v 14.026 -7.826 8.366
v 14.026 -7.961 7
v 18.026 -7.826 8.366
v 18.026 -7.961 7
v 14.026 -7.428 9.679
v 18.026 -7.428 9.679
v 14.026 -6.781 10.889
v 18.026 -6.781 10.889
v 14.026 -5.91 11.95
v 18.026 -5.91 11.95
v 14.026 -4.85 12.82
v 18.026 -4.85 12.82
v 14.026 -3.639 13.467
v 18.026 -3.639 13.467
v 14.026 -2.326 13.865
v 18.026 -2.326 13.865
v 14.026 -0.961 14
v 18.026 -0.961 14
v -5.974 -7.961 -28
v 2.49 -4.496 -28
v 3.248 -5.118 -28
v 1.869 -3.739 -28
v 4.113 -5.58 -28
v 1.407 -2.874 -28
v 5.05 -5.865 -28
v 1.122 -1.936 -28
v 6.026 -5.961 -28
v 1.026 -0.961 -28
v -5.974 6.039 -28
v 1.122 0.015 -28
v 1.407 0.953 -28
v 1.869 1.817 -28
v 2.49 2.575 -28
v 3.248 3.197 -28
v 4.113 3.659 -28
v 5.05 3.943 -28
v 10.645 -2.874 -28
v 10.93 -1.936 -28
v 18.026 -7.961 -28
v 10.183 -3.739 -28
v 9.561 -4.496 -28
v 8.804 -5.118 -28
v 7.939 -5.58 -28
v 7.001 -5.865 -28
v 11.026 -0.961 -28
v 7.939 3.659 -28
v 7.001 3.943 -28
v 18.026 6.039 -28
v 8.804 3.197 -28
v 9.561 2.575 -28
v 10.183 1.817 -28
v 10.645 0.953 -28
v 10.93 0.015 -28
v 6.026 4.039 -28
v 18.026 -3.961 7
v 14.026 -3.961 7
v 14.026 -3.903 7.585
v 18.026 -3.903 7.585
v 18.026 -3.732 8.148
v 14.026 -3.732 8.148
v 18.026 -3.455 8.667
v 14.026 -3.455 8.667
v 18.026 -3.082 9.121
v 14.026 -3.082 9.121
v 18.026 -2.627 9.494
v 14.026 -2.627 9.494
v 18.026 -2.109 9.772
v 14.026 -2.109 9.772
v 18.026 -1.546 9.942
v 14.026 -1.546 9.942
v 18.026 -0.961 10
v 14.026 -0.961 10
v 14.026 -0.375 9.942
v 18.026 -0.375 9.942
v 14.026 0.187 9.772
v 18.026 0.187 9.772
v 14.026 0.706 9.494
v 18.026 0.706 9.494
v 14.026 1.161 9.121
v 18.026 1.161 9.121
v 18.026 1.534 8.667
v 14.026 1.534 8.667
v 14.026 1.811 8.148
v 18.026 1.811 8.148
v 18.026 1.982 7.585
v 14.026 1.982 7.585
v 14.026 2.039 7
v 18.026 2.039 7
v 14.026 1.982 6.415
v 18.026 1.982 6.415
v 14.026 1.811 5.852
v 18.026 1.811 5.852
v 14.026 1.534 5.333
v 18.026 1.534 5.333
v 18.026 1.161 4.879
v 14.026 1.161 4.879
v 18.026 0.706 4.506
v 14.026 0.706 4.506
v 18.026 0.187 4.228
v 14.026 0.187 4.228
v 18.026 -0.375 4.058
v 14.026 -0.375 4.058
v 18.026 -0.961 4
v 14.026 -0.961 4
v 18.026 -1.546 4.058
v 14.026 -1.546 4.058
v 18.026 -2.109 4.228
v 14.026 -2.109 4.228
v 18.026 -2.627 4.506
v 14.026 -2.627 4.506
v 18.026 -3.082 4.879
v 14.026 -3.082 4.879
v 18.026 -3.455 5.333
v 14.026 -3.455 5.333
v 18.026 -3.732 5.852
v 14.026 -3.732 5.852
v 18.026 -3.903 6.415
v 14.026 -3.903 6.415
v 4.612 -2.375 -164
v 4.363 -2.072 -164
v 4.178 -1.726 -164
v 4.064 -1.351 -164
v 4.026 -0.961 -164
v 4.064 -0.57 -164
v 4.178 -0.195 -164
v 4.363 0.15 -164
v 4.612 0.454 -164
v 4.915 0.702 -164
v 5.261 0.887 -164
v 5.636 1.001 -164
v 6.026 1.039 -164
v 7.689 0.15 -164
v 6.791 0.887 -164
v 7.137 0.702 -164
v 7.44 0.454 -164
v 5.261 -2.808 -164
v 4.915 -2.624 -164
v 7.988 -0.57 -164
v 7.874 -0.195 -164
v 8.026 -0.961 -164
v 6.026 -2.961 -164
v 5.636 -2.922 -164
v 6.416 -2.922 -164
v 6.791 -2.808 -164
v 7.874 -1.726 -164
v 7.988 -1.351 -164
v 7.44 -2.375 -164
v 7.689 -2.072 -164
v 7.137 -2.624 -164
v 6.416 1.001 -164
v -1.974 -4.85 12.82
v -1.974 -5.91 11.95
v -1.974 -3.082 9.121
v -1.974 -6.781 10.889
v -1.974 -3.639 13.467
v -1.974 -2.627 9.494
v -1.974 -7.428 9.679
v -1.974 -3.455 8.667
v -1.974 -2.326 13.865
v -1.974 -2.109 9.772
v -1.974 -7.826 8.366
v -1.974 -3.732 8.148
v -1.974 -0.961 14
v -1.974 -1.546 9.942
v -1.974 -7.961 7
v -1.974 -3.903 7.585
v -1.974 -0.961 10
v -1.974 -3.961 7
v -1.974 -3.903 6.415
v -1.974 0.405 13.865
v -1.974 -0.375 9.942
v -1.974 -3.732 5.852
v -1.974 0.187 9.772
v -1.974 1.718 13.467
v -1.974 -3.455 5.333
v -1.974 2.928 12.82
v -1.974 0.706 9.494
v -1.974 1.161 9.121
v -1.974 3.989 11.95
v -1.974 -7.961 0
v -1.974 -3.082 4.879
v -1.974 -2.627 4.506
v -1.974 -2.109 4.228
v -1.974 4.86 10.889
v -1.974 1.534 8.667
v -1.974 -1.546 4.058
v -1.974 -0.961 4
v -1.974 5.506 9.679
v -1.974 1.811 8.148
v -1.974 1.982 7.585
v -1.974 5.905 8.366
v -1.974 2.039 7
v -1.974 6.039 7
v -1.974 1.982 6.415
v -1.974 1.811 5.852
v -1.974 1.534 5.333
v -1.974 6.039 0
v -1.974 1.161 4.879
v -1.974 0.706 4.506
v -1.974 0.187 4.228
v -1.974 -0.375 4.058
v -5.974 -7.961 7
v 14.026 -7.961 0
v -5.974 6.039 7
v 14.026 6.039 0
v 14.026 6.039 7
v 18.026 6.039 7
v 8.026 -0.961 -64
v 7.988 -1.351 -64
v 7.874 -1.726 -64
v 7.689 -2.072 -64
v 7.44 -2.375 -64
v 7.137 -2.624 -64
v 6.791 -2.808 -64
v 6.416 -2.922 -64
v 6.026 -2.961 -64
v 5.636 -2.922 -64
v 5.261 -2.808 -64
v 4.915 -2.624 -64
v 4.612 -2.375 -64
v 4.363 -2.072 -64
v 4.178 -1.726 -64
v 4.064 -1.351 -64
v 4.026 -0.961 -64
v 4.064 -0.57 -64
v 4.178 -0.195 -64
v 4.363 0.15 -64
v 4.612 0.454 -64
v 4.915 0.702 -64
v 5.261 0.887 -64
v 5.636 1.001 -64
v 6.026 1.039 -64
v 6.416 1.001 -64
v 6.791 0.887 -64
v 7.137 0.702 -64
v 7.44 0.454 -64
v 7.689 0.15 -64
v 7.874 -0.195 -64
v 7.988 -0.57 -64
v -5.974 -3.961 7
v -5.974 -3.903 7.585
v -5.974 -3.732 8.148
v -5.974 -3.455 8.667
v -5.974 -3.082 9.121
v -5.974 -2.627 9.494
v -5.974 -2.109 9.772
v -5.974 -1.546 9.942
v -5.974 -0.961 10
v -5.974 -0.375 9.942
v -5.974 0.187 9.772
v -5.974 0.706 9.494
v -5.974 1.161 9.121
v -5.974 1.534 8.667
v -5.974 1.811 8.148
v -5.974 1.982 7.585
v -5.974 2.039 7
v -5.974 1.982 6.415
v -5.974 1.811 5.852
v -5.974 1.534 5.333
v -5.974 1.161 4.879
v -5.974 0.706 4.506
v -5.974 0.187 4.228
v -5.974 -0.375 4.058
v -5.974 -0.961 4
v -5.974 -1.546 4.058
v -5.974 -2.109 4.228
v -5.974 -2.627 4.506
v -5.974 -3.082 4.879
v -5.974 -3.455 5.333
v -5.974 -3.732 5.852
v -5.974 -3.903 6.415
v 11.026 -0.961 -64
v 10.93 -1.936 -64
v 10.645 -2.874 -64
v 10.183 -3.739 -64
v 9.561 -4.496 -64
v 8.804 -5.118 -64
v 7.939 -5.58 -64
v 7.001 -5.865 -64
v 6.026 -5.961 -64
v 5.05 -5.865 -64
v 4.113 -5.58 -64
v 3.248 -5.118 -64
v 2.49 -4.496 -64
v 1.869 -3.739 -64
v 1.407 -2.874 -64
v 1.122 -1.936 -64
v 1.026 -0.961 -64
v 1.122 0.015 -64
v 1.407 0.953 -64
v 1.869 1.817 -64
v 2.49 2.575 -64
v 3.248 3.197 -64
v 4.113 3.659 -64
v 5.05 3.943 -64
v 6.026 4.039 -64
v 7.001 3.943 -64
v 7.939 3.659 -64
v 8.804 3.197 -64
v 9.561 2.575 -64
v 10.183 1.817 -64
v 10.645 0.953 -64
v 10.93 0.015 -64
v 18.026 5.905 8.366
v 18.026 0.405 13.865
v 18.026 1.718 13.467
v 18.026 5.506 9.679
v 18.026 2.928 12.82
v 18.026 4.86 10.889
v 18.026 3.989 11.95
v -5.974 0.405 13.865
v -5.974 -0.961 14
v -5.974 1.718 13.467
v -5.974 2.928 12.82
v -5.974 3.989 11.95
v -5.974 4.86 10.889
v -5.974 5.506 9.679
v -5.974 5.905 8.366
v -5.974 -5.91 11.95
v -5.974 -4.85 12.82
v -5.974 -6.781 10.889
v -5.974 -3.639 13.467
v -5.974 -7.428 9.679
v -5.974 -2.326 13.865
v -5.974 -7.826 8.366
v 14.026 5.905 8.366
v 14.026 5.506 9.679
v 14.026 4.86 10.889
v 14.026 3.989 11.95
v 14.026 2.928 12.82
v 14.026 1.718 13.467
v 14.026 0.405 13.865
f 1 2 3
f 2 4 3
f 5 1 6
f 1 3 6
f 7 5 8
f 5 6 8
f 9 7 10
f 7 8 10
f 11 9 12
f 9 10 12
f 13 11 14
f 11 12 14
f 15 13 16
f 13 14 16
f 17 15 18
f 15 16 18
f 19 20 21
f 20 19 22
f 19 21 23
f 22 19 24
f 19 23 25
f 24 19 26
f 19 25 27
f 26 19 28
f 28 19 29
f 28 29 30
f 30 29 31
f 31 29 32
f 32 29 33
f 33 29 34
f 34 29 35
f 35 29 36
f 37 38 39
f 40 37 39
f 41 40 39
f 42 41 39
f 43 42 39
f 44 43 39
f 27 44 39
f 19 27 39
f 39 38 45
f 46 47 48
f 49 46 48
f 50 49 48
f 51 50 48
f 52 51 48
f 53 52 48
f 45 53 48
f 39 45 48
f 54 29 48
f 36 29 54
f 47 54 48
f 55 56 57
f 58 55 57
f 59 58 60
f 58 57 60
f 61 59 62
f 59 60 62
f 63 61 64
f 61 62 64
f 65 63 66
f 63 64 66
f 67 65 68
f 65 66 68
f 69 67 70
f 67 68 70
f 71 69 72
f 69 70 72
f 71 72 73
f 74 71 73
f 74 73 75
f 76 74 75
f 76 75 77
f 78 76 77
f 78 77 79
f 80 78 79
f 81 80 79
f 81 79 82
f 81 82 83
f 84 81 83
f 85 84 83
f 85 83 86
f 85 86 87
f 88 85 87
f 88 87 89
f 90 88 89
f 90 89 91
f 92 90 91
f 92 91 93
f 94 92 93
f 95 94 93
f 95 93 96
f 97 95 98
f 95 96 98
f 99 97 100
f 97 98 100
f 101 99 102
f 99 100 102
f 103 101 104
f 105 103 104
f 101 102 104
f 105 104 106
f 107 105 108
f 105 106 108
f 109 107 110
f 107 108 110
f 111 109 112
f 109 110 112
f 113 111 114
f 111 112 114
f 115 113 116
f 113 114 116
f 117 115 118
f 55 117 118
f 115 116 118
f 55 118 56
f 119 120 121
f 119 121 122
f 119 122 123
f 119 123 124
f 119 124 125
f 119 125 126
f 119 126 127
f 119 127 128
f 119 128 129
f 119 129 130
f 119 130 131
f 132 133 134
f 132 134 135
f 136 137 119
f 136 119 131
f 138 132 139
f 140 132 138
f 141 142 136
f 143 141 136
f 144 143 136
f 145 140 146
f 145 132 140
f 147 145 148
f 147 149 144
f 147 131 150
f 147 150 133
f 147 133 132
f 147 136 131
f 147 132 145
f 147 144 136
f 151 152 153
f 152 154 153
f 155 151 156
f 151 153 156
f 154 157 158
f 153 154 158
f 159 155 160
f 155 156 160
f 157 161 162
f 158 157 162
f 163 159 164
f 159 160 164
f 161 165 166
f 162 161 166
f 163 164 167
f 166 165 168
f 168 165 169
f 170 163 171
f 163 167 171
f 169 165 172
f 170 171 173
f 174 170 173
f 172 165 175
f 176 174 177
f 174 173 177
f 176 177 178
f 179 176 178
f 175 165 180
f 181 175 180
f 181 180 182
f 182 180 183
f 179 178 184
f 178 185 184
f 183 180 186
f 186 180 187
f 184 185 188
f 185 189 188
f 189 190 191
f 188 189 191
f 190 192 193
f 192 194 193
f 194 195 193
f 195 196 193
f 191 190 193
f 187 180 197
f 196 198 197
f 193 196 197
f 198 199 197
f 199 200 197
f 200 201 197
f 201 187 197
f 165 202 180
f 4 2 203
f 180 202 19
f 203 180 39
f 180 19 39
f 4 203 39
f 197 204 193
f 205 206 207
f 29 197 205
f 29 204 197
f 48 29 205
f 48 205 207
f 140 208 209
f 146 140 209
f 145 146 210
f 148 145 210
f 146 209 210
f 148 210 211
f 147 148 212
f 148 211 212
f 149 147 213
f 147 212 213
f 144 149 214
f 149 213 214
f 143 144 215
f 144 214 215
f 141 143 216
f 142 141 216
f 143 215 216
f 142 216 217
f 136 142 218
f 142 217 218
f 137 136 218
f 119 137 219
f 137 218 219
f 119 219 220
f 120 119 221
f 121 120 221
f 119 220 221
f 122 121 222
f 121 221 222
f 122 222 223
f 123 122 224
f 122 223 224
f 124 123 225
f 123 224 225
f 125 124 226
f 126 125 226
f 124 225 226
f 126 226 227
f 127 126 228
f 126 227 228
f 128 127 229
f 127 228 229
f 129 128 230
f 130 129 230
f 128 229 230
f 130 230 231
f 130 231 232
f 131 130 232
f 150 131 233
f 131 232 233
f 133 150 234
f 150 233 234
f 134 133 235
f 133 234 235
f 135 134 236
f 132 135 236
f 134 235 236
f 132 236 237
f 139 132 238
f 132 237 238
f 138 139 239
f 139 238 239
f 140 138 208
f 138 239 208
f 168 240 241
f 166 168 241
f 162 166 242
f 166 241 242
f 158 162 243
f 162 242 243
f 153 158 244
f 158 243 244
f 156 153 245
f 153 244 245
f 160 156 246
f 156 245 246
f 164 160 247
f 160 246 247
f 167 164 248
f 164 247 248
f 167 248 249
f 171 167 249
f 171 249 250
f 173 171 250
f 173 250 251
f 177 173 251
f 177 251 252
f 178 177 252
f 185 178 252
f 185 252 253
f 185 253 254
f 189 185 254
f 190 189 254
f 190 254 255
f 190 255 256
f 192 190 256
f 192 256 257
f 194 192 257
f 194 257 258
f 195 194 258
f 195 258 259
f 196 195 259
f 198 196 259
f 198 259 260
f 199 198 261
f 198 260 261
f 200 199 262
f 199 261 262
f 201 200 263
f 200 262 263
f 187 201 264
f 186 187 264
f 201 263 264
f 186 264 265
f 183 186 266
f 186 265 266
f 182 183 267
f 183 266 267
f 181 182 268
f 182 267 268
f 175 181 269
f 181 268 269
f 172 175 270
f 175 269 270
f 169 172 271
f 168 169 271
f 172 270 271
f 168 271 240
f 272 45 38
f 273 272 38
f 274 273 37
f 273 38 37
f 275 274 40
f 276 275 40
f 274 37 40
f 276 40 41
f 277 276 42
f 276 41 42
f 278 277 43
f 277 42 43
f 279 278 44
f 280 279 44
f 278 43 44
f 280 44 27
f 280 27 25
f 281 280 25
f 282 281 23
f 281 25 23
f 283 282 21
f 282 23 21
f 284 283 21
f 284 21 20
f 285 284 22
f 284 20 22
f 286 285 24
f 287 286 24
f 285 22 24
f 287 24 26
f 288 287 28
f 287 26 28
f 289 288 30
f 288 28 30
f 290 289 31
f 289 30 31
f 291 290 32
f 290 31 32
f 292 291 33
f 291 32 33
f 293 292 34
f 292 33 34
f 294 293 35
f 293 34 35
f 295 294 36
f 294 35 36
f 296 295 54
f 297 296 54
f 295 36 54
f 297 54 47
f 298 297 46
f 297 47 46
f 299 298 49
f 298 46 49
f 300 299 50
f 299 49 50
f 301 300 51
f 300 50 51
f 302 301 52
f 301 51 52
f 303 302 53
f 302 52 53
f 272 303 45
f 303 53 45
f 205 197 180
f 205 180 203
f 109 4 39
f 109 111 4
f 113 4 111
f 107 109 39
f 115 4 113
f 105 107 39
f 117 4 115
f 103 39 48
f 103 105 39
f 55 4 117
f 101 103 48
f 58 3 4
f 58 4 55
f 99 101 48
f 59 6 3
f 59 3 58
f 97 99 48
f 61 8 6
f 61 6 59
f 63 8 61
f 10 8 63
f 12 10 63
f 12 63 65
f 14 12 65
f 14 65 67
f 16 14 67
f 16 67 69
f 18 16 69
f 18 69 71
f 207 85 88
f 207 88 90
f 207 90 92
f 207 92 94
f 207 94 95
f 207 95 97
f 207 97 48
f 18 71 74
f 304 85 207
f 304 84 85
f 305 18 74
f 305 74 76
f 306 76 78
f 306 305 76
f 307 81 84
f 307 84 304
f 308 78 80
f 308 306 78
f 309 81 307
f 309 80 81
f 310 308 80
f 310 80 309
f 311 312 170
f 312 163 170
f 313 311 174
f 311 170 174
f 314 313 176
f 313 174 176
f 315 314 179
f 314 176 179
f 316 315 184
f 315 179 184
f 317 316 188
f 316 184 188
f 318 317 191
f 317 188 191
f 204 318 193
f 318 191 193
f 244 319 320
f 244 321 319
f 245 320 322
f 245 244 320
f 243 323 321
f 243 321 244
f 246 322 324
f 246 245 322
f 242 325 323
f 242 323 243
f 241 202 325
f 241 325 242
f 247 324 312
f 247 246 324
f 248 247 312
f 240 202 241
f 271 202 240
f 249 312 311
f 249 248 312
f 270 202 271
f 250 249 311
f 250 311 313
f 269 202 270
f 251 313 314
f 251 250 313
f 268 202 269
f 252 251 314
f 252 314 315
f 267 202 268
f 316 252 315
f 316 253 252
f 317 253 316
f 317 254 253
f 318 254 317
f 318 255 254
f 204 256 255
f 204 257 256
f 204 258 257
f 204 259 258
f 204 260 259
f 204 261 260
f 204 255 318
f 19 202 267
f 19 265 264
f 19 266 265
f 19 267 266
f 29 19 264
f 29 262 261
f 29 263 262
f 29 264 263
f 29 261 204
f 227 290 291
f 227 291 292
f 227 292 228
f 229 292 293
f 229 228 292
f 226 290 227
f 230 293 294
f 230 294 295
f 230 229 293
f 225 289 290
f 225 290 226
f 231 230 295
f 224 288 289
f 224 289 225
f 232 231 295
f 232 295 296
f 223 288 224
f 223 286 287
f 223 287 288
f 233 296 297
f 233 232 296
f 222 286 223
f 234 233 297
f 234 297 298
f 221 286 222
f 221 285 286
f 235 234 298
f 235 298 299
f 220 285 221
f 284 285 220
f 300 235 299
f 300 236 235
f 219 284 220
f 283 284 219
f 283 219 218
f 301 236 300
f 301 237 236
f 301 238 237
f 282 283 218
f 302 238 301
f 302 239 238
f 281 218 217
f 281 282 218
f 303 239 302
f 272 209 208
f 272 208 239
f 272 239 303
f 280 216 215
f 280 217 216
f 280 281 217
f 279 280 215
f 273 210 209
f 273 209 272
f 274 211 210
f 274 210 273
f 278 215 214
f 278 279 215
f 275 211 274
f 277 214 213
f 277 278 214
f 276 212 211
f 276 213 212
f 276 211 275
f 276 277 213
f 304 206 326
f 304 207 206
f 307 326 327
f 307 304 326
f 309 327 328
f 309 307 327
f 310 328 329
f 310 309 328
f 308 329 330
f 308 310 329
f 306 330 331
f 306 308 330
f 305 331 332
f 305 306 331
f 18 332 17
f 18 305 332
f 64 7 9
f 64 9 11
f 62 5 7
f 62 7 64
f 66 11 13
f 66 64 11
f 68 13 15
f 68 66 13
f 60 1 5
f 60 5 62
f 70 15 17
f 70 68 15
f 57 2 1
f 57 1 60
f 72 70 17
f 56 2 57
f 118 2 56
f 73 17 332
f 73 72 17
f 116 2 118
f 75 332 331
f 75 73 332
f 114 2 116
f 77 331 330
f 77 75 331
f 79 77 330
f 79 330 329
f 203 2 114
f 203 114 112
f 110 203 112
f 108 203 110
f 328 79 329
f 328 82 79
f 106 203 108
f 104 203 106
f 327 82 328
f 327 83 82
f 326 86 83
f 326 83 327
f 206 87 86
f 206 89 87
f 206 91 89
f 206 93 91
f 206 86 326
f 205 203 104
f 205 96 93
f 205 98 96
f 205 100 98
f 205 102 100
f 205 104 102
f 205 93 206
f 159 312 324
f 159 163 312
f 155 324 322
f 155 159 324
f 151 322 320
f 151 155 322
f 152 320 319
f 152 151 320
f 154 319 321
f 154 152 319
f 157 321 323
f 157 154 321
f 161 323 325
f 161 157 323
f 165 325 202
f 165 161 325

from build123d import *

# Parameters (mm, degrees)
F0_W      = 24
F0_H      = 14
F1_DEPTH  = 28
F2_W      = 4
F2_H      = 14
F3_DEPTH  = 14
F5_D      = 6
F6_R      = 6.99999
F7_R      = 5
F8_DEPTH  = 36
F9_R      = 2
F10_DEPTH = 100


# Not quite as in the source:
# - a fillet or chamfer is up to 0.001 mm smaller than in the source, because OpenCascade refuses the exact size


with BuildPart() as f1:
    # F0 (on Top) → F1 (new body)
    with BuildSketch(Plane.XY):
        with Locations((6.0259448364, -0.9606586885)):
            Rectangle(F0_W, F0_H)
    extrude(amount=-F1_DEPTH)

    # F2 (on face) → F3 (join)
    with BuildSketch(Plane.XY):
        with Locations((-3.9740551636, -0.9606586885)):
            Rectangle(F2_W, F2_H)
        with Locations((16.0259448364, -0.9606586885)):
            Rectangle(F2_W, F2_H)
    extrude(amount=F3_DEPTH)

    # F5 (through all)
    with Locations(Plane.YZ.offset(18.0259448364)):
        with Locations((-0.9606586885, 7)):
            Hole(F5_D / 2)

    # F6 (radius 7 in the source; OpenCascade refuses exactly that, so slightly less here)
    f6_edges = [f1.edges().sort_by_distance(p)[0] for p in [
        (16.025945, -7.960659, 14),
        (16.025945, 6.039341, 14),
        (-3.974055, 6.039341, 14),
        (-3.974055, -7.960659, 14),
    ]]
    fillet(f6_edges, radius=F6_R)

    # F7 (on face) → F8 (join)
    with BuildSketch(Plane(origin=(0, 0, -28), x_dir=(1, 0, 0), z_dir=(0, 0, -1))):
        with Locations((6.0259448364, 0.9606586885)):
            Circle(F7_R)
    extrude(amount=F8_DEPTH)

    # F9 (on face) → F10 (join)
    with BuildSketch(Plane(origin=(0, 0, -64), x_dir=(1, 0, 0), z_dir=(0, 0, -1))):
        with Locations((6.0259448364, 0.9606586885)):
            Circle(F9_R)
    extrude(amount=F10_DEPTH)


solid = f1.part
